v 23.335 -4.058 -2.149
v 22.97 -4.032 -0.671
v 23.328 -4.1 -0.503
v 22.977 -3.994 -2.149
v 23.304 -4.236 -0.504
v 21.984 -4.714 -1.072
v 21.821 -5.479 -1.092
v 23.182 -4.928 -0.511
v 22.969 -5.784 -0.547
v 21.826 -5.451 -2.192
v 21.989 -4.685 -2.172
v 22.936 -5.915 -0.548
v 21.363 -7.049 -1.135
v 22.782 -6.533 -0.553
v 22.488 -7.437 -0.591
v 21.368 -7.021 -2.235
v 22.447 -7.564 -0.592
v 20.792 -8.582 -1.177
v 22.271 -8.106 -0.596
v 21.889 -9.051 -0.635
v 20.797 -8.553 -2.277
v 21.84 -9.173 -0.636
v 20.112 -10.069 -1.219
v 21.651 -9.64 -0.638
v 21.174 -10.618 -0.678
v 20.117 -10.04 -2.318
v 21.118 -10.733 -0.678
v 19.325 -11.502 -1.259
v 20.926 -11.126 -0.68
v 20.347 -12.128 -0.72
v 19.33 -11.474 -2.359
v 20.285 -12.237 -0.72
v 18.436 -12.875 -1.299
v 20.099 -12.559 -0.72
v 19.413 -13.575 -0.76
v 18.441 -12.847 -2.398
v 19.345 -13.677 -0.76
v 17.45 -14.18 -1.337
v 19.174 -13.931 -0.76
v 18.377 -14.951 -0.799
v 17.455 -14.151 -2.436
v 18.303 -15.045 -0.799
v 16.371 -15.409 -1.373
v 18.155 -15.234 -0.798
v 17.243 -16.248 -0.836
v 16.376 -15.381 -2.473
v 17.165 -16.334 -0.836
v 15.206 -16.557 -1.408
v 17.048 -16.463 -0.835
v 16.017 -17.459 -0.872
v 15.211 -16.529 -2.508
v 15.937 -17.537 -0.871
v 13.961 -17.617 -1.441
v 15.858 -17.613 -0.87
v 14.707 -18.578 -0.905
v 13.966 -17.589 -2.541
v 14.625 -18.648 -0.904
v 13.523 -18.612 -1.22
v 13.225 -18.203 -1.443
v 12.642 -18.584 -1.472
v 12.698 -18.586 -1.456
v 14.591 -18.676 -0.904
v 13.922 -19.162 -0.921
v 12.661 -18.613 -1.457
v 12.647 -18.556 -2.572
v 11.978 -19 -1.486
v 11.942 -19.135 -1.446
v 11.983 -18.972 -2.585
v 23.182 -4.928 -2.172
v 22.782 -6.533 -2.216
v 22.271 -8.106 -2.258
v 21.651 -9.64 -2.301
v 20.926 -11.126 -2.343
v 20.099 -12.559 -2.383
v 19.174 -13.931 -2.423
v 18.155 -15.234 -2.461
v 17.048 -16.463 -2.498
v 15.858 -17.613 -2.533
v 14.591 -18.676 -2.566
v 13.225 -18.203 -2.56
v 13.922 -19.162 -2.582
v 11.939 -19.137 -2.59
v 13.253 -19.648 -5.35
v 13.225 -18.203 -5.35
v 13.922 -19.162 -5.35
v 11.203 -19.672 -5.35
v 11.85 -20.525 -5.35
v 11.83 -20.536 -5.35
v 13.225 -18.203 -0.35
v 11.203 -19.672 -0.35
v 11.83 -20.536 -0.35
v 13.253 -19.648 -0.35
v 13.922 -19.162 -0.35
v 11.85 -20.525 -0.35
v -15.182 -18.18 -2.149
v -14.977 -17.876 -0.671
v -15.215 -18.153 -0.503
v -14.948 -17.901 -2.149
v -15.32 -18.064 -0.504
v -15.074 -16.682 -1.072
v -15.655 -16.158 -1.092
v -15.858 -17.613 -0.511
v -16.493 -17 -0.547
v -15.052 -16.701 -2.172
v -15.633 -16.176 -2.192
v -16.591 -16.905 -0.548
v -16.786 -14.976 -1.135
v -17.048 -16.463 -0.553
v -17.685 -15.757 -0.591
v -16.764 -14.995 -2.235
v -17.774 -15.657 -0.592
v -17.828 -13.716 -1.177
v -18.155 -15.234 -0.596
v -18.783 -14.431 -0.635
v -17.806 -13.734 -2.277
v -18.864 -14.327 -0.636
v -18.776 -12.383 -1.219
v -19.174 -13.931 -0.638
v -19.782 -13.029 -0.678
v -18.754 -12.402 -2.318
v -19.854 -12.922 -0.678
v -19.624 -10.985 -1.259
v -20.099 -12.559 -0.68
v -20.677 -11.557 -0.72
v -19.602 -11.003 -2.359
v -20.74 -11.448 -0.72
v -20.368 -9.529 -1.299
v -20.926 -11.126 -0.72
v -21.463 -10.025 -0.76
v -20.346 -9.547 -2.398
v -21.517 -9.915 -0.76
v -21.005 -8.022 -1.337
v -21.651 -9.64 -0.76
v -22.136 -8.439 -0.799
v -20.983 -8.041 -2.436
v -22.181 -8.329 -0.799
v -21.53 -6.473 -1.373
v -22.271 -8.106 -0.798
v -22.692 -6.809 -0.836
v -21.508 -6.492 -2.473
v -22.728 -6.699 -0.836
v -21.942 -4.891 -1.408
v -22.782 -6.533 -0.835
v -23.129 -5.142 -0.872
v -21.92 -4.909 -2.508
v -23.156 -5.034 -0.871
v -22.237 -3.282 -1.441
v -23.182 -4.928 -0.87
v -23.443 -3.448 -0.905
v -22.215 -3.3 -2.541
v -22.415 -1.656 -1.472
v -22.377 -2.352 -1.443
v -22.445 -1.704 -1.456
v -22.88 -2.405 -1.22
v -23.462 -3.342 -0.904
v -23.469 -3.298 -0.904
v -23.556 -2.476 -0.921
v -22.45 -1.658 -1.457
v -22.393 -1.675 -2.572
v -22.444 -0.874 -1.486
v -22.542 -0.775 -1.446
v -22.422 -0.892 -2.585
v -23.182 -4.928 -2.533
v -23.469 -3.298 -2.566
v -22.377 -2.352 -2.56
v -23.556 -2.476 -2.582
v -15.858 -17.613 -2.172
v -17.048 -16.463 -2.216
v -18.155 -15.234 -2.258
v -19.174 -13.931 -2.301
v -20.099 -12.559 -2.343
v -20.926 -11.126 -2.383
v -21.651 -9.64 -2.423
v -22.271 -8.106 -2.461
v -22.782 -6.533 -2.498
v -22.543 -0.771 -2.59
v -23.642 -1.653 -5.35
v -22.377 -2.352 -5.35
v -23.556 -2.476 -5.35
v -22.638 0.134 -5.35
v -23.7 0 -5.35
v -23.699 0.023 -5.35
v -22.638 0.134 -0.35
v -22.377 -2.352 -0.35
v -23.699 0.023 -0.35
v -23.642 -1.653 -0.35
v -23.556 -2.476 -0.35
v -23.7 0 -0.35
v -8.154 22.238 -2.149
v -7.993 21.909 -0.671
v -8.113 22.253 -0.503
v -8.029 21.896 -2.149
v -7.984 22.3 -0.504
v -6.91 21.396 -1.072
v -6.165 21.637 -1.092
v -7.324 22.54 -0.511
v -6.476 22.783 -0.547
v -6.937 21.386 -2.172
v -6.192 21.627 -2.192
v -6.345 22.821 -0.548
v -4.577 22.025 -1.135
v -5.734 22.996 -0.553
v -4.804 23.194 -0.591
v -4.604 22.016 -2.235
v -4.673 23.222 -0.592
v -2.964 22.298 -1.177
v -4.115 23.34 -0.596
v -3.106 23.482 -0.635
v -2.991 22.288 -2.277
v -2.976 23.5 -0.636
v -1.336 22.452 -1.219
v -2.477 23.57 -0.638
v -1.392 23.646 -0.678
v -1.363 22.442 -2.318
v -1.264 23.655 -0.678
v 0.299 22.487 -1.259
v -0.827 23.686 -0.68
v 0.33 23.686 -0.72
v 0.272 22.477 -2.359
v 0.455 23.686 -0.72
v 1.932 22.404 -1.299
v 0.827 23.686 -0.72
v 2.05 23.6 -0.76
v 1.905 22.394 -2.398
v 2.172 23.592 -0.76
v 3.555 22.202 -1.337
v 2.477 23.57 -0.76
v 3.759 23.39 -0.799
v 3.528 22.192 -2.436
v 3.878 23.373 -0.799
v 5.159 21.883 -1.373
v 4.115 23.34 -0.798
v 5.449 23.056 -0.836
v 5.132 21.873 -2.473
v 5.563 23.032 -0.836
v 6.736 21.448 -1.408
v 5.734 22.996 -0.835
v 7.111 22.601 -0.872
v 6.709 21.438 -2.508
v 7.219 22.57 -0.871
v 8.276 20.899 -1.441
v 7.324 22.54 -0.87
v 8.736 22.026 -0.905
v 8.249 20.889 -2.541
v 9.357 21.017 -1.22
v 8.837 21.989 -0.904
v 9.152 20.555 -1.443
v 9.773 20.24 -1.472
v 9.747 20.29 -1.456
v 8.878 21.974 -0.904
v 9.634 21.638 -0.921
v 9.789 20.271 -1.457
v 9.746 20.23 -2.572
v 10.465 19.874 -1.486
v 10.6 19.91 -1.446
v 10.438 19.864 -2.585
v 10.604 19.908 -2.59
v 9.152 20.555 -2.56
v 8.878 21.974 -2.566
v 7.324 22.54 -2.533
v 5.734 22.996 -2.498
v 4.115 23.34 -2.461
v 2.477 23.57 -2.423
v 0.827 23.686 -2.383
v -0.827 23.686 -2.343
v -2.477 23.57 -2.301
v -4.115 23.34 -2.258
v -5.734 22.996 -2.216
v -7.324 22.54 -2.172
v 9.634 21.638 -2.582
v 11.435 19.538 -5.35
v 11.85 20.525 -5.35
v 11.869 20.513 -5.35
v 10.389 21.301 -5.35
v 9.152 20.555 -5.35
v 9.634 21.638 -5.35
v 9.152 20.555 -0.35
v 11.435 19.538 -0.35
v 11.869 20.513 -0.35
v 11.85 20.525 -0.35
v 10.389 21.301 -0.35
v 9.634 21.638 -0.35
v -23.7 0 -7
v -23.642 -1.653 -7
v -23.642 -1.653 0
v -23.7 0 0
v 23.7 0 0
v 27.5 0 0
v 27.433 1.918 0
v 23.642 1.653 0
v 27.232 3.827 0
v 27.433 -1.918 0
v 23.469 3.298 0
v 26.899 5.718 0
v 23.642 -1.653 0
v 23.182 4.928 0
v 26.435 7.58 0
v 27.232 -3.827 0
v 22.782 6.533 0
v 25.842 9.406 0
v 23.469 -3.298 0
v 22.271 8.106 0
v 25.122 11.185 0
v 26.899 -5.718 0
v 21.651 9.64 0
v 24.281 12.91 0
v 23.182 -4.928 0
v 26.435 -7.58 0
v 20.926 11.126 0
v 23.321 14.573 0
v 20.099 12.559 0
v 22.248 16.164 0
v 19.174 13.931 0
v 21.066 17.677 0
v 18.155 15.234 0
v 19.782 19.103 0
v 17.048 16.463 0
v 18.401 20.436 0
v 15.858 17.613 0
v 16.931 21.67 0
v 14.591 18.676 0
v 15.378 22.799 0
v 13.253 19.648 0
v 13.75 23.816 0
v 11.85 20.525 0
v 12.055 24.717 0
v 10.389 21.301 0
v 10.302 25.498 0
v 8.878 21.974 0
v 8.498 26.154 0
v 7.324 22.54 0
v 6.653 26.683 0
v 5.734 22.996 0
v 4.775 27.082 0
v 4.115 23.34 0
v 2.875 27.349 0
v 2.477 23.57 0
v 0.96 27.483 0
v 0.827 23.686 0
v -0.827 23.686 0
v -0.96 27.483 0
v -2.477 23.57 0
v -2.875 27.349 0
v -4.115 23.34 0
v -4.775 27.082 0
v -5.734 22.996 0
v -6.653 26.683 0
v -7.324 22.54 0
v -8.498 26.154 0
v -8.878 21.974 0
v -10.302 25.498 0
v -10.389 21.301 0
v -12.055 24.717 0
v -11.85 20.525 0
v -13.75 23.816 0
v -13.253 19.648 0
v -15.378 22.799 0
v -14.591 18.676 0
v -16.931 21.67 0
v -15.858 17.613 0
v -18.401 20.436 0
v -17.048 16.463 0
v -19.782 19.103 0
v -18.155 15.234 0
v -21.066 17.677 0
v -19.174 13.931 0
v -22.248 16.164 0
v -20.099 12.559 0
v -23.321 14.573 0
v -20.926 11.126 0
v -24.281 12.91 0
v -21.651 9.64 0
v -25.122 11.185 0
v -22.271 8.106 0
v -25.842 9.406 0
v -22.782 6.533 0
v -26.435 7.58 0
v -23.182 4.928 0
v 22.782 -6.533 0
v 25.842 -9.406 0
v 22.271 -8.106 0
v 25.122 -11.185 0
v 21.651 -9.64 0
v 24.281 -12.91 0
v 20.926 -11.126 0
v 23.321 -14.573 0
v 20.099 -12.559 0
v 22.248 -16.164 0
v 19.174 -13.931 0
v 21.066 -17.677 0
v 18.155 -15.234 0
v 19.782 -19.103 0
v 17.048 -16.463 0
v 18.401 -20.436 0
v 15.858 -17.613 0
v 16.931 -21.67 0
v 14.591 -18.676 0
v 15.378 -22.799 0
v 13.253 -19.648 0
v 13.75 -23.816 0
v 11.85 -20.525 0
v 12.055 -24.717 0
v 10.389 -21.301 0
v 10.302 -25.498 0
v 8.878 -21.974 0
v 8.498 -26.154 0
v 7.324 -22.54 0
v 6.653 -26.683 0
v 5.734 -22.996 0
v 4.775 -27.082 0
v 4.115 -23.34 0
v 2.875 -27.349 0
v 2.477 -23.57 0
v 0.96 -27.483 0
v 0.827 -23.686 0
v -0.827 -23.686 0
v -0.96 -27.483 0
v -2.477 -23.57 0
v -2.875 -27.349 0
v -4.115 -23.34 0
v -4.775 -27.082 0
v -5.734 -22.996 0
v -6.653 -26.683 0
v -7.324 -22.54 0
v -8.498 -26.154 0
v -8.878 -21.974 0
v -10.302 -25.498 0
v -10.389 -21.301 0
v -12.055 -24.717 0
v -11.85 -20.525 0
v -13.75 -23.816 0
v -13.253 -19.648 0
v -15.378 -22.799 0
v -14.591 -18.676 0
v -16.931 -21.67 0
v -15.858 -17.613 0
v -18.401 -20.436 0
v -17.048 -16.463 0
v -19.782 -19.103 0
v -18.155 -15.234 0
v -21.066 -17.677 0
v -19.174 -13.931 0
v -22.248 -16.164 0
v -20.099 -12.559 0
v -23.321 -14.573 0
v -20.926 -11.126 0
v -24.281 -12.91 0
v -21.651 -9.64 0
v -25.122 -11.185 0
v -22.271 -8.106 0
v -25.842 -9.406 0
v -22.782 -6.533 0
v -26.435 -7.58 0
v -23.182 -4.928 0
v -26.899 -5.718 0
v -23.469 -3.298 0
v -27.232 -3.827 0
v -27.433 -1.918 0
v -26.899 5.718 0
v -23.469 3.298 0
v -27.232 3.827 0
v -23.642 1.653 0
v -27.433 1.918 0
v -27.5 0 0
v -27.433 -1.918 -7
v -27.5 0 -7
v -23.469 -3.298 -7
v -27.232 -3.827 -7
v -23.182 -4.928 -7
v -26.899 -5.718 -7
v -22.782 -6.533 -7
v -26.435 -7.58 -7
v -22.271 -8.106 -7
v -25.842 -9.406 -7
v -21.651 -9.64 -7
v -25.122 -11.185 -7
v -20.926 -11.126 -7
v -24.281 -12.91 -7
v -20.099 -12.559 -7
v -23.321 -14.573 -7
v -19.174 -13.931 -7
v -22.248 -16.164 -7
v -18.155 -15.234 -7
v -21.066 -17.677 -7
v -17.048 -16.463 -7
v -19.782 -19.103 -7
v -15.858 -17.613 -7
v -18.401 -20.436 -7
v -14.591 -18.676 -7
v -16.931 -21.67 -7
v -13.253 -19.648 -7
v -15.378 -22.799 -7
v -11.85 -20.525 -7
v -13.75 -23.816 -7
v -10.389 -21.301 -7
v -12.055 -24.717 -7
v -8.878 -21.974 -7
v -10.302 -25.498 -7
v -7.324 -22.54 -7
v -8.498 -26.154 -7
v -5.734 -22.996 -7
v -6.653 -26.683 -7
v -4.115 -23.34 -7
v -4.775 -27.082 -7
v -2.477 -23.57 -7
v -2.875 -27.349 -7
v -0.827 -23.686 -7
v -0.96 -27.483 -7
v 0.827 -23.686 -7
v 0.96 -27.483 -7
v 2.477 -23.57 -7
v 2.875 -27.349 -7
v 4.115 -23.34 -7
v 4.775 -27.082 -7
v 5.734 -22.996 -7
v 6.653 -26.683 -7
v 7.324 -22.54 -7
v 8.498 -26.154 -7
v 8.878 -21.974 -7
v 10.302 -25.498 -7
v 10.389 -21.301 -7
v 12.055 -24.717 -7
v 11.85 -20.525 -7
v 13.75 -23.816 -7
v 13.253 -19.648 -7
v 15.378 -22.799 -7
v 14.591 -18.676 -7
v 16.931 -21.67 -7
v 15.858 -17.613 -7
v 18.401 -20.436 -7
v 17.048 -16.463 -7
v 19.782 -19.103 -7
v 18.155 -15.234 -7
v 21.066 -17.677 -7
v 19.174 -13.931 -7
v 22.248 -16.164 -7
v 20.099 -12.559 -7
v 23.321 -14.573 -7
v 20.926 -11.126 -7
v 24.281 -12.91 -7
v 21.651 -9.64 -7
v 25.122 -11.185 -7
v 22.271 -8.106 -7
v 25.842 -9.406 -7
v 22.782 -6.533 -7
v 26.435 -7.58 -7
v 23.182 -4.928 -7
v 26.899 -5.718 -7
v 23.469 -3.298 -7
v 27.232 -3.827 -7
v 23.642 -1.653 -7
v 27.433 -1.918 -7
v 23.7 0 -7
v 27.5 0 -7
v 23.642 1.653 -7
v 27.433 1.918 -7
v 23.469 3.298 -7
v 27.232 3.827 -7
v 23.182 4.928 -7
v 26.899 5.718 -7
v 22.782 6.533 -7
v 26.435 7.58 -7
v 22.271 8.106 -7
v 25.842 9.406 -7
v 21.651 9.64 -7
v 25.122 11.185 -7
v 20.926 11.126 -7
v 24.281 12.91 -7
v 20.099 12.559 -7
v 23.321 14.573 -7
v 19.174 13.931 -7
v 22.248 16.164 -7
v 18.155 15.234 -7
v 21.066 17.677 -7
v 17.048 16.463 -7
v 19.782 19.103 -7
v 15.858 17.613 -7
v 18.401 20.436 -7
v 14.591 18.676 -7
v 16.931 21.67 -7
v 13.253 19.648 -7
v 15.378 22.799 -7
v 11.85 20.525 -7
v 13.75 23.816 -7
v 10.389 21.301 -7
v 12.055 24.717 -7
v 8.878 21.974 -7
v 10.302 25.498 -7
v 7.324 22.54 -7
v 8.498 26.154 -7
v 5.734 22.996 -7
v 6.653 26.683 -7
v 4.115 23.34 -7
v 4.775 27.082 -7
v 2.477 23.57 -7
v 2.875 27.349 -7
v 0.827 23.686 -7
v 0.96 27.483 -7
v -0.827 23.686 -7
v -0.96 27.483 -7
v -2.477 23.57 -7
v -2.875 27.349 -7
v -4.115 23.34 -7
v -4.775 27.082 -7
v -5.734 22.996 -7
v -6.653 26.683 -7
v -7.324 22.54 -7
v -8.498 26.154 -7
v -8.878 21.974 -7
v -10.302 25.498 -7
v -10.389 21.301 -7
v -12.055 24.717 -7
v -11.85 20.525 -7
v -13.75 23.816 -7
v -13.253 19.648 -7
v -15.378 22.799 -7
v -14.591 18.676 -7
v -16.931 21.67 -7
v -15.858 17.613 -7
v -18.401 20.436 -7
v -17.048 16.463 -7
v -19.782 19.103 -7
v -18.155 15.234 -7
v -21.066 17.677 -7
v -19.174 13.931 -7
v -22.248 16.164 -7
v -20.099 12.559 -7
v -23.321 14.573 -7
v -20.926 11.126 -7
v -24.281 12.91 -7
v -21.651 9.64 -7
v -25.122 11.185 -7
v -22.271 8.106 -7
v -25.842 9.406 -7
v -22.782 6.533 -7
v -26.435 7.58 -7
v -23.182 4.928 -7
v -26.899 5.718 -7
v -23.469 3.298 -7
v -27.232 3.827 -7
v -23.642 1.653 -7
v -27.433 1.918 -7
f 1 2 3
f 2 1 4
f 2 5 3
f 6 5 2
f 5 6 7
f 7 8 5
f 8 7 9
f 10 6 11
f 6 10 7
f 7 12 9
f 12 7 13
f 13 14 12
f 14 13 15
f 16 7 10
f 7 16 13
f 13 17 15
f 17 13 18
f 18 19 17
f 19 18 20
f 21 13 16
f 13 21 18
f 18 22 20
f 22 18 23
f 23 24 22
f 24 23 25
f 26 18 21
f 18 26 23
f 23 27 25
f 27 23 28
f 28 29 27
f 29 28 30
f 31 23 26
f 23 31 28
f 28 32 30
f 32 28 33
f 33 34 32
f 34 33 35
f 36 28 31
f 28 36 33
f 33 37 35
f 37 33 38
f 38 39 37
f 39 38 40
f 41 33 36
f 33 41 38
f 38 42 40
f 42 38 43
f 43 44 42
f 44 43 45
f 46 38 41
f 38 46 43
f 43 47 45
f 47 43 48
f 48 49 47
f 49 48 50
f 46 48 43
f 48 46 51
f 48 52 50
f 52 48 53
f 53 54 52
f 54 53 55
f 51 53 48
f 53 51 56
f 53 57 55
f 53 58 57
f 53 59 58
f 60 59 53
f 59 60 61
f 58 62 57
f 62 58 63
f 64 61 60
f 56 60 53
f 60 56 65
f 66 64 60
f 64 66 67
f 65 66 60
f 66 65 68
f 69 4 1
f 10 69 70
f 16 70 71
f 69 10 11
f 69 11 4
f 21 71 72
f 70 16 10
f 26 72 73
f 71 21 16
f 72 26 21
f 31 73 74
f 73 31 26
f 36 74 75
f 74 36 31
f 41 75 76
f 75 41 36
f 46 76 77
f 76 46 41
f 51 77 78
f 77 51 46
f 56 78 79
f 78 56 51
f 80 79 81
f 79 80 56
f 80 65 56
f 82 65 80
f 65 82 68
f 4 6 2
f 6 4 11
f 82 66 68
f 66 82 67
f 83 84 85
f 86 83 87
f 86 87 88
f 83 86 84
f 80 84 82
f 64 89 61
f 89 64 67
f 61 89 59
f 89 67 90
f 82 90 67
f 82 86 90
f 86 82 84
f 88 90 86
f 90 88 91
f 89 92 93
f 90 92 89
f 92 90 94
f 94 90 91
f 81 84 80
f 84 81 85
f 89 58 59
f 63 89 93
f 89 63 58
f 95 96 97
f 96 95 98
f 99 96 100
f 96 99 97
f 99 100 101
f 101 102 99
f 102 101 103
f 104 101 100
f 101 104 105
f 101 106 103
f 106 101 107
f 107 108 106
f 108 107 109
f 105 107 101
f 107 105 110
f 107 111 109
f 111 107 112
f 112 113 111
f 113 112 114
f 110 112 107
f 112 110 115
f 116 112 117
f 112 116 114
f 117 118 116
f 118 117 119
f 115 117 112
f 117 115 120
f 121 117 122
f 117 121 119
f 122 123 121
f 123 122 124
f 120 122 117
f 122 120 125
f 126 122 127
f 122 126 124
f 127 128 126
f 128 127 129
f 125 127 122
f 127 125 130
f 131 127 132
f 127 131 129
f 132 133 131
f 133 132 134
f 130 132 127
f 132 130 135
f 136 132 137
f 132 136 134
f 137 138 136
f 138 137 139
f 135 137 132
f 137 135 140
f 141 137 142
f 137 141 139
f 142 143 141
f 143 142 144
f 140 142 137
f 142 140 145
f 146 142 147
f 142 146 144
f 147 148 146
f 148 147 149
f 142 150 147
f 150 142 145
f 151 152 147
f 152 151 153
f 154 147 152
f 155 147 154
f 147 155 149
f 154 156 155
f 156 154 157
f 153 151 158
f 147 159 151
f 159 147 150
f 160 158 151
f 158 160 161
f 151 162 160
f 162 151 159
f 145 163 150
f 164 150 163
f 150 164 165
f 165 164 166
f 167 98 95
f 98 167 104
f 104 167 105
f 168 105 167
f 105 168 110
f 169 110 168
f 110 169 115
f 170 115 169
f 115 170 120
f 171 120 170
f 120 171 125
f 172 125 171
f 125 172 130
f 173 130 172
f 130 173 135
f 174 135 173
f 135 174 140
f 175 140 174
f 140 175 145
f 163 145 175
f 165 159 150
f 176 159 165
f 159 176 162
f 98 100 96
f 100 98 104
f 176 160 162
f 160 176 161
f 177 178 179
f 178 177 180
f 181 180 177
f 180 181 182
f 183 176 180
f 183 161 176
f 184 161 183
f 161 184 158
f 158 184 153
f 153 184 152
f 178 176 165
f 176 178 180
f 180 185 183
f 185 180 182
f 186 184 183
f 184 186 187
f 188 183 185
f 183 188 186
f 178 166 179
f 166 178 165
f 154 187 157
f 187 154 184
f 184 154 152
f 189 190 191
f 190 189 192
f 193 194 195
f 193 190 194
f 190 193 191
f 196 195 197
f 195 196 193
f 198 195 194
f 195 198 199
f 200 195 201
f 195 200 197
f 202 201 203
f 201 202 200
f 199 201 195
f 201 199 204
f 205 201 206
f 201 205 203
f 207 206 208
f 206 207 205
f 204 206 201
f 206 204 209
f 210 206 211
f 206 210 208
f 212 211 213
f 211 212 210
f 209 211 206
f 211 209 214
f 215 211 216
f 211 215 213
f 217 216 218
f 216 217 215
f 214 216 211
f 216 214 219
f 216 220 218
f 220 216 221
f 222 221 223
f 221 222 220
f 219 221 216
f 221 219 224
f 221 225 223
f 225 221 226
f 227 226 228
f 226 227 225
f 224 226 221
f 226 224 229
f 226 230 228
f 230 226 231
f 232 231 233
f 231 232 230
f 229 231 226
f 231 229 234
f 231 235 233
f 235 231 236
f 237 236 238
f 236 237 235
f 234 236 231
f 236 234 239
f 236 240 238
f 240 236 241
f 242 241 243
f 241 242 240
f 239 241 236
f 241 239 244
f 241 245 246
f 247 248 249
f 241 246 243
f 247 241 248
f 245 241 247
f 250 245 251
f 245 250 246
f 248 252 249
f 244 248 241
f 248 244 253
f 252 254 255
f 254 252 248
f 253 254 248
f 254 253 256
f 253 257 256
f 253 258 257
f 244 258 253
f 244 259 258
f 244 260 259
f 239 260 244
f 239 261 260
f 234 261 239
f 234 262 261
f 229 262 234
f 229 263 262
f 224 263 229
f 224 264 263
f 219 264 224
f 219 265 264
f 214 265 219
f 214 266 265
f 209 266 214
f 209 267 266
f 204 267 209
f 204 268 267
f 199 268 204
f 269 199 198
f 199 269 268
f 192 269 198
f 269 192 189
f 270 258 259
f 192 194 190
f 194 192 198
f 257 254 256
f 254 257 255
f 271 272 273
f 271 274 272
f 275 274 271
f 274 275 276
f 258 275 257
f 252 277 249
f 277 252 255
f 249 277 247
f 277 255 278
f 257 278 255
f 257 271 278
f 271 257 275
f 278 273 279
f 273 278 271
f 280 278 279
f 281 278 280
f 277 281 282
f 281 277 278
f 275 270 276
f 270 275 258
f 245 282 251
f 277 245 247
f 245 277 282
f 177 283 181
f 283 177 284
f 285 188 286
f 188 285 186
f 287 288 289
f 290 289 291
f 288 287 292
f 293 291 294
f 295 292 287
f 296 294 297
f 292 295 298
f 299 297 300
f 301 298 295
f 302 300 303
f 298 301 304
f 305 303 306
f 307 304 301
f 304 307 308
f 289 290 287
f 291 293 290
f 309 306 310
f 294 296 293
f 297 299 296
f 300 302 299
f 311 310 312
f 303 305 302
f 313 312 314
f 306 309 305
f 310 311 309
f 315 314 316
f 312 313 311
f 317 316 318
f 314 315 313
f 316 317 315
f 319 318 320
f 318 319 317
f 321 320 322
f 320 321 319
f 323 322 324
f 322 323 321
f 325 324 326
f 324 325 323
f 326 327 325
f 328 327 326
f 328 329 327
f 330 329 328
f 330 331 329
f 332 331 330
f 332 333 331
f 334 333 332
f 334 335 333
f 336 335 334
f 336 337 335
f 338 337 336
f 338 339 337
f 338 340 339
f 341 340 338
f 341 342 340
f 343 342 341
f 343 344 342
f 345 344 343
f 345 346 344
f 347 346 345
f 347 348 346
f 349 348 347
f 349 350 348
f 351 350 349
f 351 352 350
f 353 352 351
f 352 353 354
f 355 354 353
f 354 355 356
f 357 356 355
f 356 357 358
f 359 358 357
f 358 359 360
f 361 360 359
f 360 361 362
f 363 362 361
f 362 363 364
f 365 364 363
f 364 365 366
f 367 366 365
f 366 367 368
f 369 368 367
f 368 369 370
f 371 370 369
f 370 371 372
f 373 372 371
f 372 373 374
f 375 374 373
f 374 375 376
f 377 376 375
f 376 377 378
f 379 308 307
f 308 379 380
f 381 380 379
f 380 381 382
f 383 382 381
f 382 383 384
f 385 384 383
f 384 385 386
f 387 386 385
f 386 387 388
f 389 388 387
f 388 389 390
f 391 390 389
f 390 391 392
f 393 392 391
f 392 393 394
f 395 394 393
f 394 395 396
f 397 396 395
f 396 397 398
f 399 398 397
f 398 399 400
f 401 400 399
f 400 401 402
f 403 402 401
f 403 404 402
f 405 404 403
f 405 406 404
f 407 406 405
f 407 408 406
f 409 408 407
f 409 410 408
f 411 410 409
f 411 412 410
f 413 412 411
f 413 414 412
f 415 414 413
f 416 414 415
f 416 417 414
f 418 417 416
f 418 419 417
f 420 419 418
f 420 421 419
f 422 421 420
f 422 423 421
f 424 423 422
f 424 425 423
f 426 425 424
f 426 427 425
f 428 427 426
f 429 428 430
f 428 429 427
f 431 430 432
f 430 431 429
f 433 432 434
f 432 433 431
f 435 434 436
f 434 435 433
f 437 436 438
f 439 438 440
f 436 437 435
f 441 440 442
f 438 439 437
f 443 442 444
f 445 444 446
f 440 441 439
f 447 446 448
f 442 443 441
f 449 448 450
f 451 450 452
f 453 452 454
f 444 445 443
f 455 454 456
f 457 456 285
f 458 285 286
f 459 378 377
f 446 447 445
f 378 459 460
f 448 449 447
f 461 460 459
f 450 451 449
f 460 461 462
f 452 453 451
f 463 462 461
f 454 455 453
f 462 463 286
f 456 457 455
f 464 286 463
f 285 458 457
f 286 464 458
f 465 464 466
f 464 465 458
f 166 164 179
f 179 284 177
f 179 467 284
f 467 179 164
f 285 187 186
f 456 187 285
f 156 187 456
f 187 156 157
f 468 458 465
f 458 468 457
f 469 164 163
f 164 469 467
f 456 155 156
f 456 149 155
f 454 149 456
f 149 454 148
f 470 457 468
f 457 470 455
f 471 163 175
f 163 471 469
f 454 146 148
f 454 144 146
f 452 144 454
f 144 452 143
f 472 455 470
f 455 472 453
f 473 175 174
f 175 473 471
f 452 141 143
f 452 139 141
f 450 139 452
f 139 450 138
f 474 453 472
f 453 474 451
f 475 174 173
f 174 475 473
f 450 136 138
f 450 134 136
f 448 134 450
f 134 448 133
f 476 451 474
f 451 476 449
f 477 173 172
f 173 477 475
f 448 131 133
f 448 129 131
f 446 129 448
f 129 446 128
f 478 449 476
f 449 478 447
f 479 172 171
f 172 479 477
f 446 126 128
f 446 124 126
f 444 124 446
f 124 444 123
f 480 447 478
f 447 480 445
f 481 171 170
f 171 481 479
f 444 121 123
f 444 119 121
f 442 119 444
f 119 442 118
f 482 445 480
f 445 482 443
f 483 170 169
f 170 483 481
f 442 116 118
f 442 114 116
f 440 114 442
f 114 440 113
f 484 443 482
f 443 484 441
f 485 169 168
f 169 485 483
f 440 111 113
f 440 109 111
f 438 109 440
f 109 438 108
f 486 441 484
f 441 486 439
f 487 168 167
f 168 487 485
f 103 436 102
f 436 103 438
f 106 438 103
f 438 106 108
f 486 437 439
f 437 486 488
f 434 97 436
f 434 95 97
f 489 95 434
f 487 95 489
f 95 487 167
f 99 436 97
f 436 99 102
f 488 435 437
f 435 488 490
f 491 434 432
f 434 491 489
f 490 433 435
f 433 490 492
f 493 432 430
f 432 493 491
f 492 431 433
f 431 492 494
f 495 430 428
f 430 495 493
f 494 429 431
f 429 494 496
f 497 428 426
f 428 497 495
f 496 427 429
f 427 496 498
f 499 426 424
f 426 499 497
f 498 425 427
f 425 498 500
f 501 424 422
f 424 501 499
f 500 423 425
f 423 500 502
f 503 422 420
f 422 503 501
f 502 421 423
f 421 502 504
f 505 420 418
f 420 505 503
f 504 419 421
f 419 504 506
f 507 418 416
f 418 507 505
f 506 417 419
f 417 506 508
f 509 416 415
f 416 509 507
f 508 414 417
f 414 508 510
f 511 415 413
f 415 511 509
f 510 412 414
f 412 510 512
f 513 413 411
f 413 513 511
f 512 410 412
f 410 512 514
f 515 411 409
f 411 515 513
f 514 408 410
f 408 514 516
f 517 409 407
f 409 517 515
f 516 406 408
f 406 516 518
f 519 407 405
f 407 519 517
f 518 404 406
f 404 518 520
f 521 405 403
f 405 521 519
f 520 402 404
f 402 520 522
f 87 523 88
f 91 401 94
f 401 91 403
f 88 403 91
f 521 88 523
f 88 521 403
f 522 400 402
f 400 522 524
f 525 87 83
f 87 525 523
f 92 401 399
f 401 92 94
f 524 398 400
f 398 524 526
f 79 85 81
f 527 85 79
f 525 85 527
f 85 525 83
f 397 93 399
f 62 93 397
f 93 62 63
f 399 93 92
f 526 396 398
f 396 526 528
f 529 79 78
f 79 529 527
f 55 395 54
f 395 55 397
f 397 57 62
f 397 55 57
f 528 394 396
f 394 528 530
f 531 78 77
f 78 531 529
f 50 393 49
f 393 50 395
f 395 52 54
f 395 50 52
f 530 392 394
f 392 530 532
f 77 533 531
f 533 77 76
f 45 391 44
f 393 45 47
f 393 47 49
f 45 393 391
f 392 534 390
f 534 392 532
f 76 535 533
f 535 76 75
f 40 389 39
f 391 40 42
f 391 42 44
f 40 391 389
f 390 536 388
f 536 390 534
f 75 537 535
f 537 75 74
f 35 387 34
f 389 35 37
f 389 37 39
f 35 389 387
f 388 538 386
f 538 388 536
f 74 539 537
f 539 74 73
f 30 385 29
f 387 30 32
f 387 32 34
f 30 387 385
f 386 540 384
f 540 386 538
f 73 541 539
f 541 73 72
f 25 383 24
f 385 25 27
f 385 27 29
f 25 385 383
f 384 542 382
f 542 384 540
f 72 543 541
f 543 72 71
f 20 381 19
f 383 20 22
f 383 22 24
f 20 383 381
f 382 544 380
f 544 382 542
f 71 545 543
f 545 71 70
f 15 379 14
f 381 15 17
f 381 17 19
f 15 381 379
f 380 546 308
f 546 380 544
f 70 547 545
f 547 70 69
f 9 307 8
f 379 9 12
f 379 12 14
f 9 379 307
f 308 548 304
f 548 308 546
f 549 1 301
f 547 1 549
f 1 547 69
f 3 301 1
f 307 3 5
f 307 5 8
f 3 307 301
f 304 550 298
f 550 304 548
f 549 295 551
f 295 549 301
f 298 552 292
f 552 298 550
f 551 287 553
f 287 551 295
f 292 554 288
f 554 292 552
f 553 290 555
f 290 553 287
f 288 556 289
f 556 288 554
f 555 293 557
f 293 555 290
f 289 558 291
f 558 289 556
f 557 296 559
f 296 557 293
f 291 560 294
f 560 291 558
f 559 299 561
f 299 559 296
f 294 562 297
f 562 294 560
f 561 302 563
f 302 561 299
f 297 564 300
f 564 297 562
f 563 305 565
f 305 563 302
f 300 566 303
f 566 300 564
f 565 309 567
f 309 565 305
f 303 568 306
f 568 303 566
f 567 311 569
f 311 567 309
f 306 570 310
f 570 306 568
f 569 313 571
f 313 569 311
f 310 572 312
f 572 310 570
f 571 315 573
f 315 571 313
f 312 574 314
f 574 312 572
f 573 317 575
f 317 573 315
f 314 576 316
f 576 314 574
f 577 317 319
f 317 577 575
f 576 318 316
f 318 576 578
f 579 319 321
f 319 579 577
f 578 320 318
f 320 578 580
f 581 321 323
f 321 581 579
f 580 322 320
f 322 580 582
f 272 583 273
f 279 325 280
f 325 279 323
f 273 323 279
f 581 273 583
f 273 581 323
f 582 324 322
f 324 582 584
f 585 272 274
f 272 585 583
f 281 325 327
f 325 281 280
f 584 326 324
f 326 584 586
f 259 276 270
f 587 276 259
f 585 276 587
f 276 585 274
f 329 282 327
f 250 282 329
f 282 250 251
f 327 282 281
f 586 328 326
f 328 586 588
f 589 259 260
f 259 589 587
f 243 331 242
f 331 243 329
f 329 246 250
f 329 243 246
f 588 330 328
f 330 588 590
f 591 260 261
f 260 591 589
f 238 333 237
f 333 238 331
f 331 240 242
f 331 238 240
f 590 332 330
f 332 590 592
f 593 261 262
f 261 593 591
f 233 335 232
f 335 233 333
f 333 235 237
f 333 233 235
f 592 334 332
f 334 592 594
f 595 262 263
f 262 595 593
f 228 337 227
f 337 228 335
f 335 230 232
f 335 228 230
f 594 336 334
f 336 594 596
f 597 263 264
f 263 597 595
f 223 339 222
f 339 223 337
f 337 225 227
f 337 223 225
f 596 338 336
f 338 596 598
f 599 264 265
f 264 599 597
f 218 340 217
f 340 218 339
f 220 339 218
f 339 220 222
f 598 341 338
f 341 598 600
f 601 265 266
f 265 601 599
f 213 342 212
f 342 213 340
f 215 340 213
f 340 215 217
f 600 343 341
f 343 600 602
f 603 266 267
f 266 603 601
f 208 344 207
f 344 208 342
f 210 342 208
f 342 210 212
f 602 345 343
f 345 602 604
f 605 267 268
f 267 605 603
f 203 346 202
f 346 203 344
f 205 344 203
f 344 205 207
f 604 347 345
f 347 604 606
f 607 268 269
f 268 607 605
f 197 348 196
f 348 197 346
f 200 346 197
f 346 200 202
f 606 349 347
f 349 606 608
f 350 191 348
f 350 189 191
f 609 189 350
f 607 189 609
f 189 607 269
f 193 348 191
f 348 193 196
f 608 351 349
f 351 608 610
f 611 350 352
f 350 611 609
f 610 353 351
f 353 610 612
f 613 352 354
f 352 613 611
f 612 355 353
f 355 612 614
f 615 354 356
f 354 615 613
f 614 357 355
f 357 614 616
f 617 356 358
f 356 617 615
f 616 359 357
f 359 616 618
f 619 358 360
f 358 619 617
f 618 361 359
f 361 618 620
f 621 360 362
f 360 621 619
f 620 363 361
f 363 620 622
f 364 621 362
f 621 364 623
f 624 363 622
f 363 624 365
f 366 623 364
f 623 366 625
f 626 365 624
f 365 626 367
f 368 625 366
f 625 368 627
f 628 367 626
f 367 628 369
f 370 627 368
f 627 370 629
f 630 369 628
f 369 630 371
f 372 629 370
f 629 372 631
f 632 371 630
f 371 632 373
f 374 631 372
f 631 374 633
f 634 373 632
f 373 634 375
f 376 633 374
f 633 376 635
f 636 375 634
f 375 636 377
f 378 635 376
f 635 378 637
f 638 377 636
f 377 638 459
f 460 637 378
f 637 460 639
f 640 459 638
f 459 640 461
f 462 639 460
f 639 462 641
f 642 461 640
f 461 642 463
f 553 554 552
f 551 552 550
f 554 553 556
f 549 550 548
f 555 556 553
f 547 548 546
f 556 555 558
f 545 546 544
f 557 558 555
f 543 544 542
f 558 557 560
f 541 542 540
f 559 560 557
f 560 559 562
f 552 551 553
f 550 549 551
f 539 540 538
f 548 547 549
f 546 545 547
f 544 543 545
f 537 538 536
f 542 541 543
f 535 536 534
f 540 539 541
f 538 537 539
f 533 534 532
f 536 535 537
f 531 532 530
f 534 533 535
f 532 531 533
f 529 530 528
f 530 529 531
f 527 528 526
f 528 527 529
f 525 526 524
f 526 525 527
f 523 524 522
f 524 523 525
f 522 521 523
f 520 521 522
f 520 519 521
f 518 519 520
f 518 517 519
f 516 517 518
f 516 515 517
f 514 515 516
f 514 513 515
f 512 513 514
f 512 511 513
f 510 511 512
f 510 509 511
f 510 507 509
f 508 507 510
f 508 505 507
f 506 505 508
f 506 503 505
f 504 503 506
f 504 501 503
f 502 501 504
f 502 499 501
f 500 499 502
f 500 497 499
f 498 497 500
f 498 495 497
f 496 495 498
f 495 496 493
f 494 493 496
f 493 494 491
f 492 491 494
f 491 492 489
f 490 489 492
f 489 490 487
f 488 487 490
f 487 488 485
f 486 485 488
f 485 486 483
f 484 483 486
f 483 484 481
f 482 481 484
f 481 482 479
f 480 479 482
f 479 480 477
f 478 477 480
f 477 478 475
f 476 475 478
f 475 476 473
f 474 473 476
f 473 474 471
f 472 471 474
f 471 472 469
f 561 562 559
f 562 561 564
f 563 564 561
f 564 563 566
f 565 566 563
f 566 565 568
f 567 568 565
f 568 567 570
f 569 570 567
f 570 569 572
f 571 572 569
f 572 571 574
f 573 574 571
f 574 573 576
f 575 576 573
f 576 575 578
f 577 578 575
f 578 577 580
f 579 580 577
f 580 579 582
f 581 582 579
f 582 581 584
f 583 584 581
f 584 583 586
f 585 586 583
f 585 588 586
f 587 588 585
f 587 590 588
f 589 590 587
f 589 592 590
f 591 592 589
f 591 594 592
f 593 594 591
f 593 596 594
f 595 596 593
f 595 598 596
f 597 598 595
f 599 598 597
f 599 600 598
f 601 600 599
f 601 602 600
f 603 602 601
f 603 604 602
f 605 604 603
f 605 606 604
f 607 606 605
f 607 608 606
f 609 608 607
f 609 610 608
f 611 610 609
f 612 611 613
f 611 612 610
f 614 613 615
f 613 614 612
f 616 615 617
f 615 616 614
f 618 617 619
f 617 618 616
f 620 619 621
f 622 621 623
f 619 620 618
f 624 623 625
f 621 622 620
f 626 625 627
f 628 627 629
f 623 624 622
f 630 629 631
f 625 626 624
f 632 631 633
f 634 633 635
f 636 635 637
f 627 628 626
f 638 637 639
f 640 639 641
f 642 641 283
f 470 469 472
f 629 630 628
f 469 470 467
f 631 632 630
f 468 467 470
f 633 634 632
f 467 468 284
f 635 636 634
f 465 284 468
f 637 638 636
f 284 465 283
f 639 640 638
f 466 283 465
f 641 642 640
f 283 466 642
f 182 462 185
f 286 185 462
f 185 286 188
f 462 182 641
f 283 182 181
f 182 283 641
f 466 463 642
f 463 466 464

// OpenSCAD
// file: mft.scad
// Copyright (c) 2020 otherthing 
// Based on https://www.thingiverse.com/thing:4349420
// CC-attribution

inch = 25.4;

tweak1 = 0.15;
tweak2 = 0.4;

// MD:  43.50
// MFT: 19.25
// diff 24.25


// heights of several stages...
h1 = 2.5; 		// base plate 
h2 = h1 + 1.2 - tweak1; 	//center ring over base plate 0.1205*inch;
h3 = h1 + 2.9 + tweak2; 	//lower end of snappers
h4 = h1 + 4.8;	//upper end of snappers
h4a = h4-0.6;


// outer disk diameter, must be big enough to host the snap hole
//r_outer = 26; //to be set by includer...

// sensor diag is 21.63 
// 
r_3 = 40.8/2; // outer dia of bayonett segments
r_2 = 38.2/2; // between bayonett and center ring
r_1 = 41.2/2; // center-ring dia balow bayonett

// overhang reducer for bayonett 
ang = 0.15; // lower val=more overhang

r_inner = r_2-1.6;
r_inner2 = r_2-0.8;


// basic adapter structure
points = [
[r_inner,0],
[r_outer,0],
[r_outer,h1],
[r_1,h1],
[r_1,h2],
[r_2,h2],
[r_2,h3-ang],
[r_3,h3+ang],
[r_3,h4-2*ang],
[r_2,h4],
[r_inner2,h4],
[r_inner2,h4a],
[r_inner,h4a],
for(i=[0:4])
 for (j=[0:1])
  [r_inner-j, h4a-i],

];


// radius of triangle to shape the bayonett segments
r_tri = 31;

// triangle
p_tri = [
[-r_tri,0],
[sin(30)*r_tri,sin(60)*r_tri],
[sin(30)*r_tri,-sin(60)*r_tri],
];

module triangle()
{
  linear_extrude(h4)
  polygon(p_tri);
}


// the mft connector
module mft()
{
  intersection()
  {
    difference()
    {
    rotate_extrude()
      polygon(points);
    
      //for (angle=[0,120,240]) rotate([0,0,angle])   
    translate([-1.15,-25,0])  
      cube([2.1,4,h1+1]);

    translate([-r_outer-1.5,0,0])  
      cylinder(r=3,h=h1+1);
    }
    union()
    {
      cylinder(r=r_2, h=h4);
        
      translate([-r_outer,-r_outer,0])
        cube([r_outer*2,r_outer*2,h3-0.01-ang]);

      triangle();
    }
  }
}

//mft(); // test
// main file
$fa=4;
$fs=0.4;

r_outer = 55/2;

include <mft.scad>

// difference of systems relative to base plate
// https://de.wikipedia.org/wiki/Auflagema%C3%9F
// M4/3  19.25
// Konika "K/AR" 40.50
h_adapt = 40.50-19.25-h1; // 26.21-1

innerTolerance = 0.15;
kamera_cent = 47.1/2+innerTolerance;
kamera_snap = 45/2;
kamera_outer = r_outer;
kamera_inner = kamera_outer - 1.6;
kamera_base = kamera_outer;

snapUpShift = .95+1.2;
pk_h1 = 2.5-snapUpShift;
pk_h2 = 4.3-snapUpShift;  // 

pk_h_foot = 2.5;

aa =  0;
a1 =  0;
a1d = 50;
a2 =  120;
a2d = 50;
a3 =  240;
a3d = 50;

// anti-reflexion ring  
pk_hr1 = 7;

// shape of the MD part
pk_points=[
[kamera_cent, 0],

// outer shape
[kamera_base, 0],
[kamera_base, pk_h_foot],
[kamera_outer, pk_h_foot],
[kamera_outer, h_adapt-1],
[r_outer, h_adapt],

// inner shape
[r_inner, h_adapt],
[kamera_inner, h_adapt-(kamera_inner-r_inner)/2],

[kamera_inner, pk_hr1],
[kamera_cent, pk_hr1],

//[kamera_cent, h_adapt-(kamera_cent-r_inner)/2],

];


pk_points_snap=[
[kamera_cent+.1, pk_h2],
[kamera_cent+.1, pk_h1+0.1],
[kamera_snap, pk_h1+0.7],
[kamera_snap, pk_h2],
];


module snap_shaper()
{
  translate([kamera_cent-2.5,0,pk_h1+1.5])
    rotate([0,0,45])
      cube([3,3,3],center=true);
}

module snapper(ang)
{
  rotate([1.5,0,0])
  difference()
  {
    rotate_extrude(angle=ang)
    polygon(pk_points_snap);

    snap_shaper();

    rotate([0,0,ang])
      snap_shaper();
  }
  
  rotate([0,0,ang-6]) translate([kamera_snap,0,pk_h1]) cube([pk_h_foot,pk_h_foot,5]);
}

as = 10;
module snappers()
{
  union()
  {
    rotate([0,0,a1+as])
      snapper(a1d);
    
    rotate([0,0,a2+as])
      snapper(a2d);
    
    rotate([0,0,a3+as])
      snapper(a3d);
  }
}

a_hole = 0;

module screw_hole()
{
    rotate([0,0,a_hole])
  translate([0,0,pk_h2+1.3])
      rotate([90,0,0])
        cylinder(r=1.3,h=30);
}

module screw_strenghener()
{
    rotate([0,0,a_hole])
  translate([0,-r_outer+0.5,pk_h2+1.3])
      rotate([90,0,0])
        cylinder(r=3,h=2.5);
}




module ar()
{
  difference()
  {
    union()
    {
      // basic shape
      rotate_extrude()
        polygon(pk_points);
      
      // the 3 snappers
      snappers();      
      //screw_strenghener();
    }
    //screw_hole();
  }
 
}
// finally, put together telescope part and mft part

/*
union()
{
  translate([0,0,h_adapt])
    mft();

  ar();
} */

module trimmedAR() {
    intersection() {
        rotate([180,0,0]) ar();
        cube([80,80,pk_hr1*2], center=true);
    }
}

function arHeight() = pk_hr1;
function arInnerDiameter() = 2*kamera_cent;
function arOuterDiameter() = 2*kamera_outer;

trimmedAR();

//snappers();
